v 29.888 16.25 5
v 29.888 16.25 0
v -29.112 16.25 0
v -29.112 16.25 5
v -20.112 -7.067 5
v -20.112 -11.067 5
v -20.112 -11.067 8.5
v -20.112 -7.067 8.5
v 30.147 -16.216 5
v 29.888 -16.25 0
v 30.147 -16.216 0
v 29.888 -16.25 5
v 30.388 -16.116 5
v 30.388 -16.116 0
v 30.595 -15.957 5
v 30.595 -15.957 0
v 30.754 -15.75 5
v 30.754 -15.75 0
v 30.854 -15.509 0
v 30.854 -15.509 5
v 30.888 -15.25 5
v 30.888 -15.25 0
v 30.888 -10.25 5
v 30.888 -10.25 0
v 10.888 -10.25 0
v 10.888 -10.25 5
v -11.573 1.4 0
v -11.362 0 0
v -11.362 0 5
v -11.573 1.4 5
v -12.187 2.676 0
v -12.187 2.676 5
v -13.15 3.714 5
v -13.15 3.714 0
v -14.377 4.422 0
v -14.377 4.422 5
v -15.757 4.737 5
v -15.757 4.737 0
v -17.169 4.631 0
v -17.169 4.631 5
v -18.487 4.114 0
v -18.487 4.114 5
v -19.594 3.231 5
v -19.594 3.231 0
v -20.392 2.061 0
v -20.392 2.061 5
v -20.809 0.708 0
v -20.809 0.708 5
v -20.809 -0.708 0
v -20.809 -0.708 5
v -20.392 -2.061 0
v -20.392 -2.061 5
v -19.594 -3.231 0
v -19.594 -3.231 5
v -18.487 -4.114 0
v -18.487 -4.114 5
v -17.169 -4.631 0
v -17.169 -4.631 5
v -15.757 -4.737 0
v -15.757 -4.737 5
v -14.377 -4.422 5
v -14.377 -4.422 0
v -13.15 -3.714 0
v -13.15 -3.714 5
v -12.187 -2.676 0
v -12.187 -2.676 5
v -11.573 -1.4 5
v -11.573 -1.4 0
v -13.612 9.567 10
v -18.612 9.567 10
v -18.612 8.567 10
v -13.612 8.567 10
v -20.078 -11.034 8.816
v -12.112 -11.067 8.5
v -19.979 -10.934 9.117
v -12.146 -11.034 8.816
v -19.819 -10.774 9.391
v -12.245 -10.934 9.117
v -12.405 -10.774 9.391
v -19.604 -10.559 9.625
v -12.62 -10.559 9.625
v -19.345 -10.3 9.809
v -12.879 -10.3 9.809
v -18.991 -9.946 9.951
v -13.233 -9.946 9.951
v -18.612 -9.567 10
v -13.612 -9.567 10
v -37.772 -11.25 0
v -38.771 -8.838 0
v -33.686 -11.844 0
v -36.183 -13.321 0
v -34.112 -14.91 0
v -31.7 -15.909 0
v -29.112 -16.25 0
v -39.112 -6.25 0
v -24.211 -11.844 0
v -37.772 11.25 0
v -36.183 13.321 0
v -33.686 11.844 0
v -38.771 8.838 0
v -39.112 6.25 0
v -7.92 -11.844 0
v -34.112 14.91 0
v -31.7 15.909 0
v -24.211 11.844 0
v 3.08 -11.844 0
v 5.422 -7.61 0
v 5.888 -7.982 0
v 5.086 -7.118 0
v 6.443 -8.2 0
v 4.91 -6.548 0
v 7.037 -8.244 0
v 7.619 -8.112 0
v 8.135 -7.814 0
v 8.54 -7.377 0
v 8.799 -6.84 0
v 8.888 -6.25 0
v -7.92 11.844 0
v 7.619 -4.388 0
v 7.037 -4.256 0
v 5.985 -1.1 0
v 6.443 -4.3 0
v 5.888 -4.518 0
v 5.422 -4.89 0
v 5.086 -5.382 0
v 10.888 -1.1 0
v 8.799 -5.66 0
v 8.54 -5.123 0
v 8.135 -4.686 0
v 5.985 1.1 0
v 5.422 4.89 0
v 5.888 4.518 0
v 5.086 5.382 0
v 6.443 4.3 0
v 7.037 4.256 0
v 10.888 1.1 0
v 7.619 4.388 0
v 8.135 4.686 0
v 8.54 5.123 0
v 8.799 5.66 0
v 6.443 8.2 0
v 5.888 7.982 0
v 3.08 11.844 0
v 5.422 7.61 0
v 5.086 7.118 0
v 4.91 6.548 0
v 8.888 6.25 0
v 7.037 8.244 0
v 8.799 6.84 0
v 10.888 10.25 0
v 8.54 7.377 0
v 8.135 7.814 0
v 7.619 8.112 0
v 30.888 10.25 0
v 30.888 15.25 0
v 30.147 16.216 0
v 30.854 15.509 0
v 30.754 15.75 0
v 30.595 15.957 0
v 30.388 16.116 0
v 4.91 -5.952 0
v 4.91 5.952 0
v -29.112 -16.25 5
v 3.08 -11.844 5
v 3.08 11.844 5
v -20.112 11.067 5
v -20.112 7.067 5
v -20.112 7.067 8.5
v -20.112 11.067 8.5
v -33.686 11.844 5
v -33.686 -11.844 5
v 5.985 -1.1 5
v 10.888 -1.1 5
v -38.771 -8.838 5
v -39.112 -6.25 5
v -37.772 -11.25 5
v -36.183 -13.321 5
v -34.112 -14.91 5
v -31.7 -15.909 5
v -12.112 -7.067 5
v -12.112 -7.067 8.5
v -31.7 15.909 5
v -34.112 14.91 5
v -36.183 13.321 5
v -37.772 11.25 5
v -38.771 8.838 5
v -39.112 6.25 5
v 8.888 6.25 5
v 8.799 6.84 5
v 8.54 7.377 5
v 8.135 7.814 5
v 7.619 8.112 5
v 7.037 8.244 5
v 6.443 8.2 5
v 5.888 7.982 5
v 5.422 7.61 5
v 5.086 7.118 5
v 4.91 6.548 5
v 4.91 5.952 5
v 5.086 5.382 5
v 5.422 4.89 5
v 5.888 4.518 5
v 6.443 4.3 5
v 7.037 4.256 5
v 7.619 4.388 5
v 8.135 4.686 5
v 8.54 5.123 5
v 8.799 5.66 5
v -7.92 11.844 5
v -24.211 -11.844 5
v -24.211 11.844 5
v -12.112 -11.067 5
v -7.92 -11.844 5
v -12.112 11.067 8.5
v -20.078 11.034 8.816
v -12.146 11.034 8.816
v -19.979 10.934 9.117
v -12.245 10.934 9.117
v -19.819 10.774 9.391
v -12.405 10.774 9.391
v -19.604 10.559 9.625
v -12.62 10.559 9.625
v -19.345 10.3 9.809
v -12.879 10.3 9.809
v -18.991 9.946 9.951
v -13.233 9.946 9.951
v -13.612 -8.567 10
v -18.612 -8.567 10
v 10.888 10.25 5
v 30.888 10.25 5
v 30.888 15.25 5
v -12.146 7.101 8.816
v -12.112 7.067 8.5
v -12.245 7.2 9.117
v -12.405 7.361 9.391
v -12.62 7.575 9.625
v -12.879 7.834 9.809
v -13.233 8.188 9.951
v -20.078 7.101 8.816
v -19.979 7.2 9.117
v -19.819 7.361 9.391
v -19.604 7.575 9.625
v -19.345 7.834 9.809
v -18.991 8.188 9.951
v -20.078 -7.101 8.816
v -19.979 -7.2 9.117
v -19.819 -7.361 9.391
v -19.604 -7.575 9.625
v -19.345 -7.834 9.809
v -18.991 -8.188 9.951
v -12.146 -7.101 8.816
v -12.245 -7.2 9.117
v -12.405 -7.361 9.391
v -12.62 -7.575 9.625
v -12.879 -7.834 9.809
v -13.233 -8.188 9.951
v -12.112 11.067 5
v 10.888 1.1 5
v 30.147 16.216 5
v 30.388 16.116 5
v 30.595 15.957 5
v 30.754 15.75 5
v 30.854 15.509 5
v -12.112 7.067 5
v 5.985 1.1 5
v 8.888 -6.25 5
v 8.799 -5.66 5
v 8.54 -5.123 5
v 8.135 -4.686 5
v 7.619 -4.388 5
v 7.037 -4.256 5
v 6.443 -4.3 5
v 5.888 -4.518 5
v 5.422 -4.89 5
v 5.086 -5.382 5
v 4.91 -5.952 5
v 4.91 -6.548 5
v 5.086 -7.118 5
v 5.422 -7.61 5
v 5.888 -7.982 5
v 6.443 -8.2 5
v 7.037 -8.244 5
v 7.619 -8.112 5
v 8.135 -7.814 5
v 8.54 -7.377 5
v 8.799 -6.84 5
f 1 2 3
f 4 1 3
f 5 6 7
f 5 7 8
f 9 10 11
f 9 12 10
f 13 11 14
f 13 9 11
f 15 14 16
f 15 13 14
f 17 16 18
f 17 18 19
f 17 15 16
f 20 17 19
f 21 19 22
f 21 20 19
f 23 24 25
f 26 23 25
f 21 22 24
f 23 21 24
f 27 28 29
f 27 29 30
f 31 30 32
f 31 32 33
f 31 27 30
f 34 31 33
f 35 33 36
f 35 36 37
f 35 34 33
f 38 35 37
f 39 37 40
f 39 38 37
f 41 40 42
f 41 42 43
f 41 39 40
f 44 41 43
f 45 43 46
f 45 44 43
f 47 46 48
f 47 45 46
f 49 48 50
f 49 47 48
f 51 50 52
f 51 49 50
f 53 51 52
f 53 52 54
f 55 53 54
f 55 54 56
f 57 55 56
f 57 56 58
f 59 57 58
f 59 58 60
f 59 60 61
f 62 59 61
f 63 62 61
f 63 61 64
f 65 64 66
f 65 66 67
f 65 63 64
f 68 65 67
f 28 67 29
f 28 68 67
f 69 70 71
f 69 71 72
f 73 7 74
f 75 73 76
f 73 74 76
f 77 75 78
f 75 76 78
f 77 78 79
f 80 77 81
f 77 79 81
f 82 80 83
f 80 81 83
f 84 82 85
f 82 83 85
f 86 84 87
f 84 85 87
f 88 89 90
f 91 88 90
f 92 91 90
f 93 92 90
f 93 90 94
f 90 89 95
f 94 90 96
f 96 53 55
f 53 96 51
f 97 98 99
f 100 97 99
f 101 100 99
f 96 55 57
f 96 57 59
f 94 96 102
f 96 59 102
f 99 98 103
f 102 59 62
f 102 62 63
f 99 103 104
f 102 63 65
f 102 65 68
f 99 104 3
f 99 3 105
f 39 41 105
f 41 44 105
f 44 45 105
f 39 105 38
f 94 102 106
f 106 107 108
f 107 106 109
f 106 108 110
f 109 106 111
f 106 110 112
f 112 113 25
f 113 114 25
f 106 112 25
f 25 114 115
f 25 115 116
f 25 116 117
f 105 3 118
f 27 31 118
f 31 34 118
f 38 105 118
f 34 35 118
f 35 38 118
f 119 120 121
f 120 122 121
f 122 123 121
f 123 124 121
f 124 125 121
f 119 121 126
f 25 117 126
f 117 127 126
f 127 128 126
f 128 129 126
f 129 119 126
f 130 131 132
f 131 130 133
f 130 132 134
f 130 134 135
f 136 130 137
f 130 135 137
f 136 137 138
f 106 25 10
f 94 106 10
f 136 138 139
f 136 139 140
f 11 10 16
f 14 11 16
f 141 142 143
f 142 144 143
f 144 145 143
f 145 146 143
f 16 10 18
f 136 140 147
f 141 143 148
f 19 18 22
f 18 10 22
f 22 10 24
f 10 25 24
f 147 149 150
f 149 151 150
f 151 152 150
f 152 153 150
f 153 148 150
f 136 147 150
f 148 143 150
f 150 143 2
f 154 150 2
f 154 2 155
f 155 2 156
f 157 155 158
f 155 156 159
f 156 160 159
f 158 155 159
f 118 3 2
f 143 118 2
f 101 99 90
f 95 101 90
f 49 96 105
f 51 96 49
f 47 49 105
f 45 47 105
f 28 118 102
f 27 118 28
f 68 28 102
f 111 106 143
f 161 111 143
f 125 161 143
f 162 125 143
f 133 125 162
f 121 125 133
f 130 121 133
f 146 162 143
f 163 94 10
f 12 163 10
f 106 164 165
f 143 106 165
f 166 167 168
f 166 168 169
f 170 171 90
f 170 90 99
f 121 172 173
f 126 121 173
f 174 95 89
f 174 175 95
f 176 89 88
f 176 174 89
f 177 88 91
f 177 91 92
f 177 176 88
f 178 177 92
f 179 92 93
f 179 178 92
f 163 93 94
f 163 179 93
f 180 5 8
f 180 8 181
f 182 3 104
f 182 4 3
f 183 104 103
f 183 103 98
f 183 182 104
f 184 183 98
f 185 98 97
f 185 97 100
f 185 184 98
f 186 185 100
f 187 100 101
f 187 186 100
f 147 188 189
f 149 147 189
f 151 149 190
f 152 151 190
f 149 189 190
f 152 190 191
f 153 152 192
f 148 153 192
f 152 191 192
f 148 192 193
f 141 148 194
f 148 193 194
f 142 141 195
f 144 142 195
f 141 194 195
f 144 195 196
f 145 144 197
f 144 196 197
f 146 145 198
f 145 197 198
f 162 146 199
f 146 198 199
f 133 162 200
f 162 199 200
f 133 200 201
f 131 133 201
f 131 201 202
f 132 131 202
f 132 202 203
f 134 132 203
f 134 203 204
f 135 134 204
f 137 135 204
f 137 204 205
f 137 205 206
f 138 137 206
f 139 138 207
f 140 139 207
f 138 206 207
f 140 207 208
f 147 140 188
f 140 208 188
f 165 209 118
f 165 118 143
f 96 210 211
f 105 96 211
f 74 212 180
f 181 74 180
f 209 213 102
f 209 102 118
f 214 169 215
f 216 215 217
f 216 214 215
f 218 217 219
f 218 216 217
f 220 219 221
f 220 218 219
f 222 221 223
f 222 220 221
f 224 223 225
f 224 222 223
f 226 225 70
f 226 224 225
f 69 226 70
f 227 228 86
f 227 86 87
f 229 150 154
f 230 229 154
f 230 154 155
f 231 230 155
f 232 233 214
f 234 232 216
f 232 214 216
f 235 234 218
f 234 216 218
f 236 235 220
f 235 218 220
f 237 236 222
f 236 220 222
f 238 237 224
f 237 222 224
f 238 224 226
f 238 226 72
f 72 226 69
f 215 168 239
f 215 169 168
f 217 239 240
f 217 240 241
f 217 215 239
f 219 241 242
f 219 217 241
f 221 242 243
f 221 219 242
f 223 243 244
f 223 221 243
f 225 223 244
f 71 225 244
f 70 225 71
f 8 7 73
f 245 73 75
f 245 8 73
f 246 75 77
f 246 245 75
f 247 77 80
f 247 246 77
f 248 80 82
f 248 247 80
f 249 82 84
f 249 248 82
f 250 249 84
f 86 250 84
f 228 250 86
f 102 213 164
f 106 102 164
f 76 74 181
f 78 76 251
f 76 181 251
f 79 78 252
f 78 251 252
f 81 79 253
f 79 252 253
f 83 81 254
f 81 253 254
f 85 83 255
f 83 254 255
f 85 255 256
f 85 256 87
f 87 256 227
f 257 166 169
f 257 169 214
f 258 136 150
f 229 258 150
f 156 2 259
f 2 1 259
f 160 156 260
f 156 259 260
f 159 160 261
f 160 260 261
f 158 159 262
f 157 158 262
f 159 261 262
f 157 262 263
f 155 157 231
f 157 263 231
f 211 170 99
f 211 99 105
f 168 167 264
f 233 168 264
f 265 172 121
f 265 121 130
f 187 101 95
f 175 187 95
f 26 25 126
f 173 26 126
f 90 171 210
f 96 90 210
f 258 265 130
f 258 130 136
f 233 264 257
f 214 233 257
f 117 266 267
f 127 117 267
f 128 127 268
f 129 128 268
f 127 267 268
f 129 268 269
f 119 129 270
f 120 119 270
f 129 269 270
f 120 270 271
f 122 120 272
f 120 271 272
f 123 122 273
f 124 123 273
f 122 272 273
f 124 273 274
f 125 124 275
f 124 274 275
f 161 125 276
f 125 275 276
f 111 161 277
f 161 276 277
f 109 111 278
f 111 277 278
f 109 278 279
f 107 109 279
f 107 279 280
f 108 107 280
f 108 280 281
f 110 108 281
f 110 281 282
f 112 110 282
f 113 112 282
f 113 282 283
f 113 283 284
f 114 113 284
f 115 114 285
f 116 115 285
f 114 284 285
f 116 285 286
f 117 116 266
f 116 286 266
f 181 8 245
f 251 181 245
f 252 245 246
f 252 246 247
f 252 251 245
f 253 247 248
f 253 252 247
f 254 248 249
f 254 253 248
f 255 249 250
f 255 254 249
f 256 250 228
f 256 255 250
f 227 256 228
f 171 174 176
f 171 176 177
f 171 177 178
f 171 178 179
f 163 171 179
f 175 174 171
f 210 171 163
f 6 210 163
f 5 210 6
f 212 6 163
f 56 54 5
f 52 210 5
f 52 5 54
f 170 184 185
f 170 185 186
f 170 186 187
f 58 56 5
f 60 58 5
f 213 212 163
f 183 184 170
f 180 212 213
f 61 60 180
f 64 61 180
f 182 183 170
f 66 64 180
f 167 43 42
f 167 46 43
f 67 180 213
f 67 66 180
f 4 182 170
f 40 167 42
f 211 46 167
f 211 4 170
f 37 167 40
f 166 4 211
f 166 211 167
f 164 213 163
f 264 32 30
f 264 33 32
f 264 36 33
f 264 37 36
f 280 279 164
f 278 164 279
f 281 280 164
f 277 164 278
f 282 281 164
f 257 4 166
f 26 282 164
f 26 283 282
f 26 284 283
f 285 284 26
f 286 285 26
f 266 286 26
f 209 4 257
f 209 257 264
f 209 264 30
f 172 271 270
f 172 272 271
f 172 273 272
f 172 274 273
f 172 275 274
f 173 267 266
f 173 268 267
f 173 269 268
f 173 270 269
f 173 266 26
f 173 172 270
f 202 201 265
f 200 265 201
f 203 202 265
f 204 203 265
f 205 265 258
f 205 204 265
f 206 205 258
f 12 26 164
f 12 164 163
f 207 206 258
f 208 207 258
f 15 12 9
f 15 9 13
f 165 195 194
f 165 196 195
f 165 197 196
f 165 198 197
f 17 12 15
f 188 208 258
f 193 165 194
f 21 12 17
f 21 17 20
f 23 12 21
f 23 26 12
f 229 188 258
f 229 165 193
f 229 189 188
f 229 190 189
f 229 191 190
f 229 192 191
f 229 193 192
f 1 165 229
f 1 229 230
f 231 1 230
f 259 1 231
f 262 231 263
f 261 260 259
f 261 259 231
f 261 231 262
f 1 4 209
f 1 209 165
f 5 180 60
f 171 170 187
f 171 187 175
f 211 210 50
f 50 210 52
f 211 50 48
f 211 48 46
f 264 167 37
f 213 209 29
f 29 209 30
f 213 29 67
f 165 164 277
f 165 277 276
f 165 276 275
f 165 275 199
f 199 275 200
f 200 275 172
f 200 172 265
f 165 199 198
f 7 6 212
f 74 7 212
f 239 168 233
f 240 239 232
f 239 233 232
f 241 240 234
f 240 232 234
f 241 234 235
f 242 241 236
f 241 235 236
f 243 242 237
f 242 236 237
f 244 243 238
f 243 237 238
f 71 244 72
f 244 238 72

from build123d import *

# Parameters (mm, degrees)
SKETCH_R      = 4.75
PAD_DEPTH     = 5
FILLET_R      = 10
FILLET001_R   = 1
SKETCH001_R   = 2
SKETCH001_W   = 9.475223
SKETCH001_H   = 23.68809
SKETCH001_W_2 = 11
SKETCH001_W_3 = 4.903309
SKETCH001_H_2 = 2.2
POCKET_DEPTH  = 5
SKETCH002_W   = 8
SKETCH002_H   = 4
PAD001_DEPTH  = 5
FILLET002_R   = 1.5


with BuildPart() as part:
    # Sketch → Pad (new body)
    with BuildSketch(Plane.XY):
        Polygon((30.887989, 10.25), (30.887989, 16.25), (-39.112011, 16.25), (-39.112011, -16.25), (30.887989, -16.25), (30.887989, -10.25), (10.887989, -10.25), (10.887989, 10.25), align=None)
        with Locations((-16.112011, 0)):
            Circle(SKETCH_R, mode=Mode.SUBTRACT)
    extrude(amount=PAD_DEPTH)

    # Fillet
    fillet_edges = [part.edges().sort_by_distance(p)[0] for p in [
        (-39.112011, -16.25, 2.5),
        (-39.112011, 16.25, 2.5),
    ]]
    fillet(fillet_edges, radius=FILLET_R)

    # Fillet001
    fillet001_edges = [part.edges().sort_by_distance(p)[0] for p in [
        (30.887989, -16.25, 2.5),
        (30.887989, 16.25, 2.5),
    ]]
    fillet(fillet001_edges, radius=FILLET001_R)

    # Sketch001 (on Face5 of Fillet001) → Pocket (cut)
    with BuildSketch(Plane.XY.offset(5)):
        with Locations((6.887989, 6.25)):
            Circle(SKETCH001_R)
        with Locations((6.887989, -6.25)):
            Circle(SKETCH001_R)
        with Locations((-28.9485835, 0)):
            Rectangle(SKETCH001_W, SKETCH001_H)
        with Locations((-2.4204911845, 0)):
            Rectangle(SKETCH001_W_2, SKETCH001_H)
        with Locations((8.4363345, 0)):
            Rectangle(SKETCH001_W_3, SKETCH001_H_2)
    extrude(amount=-POCKET_DEPTH, mode=Mode.SUBTRACT)

    # Sketch002 (on Face5 of Pocket) → Pad001 (join)
    with BuildSketch(Plane.XY.offset(5)):
        with Locations((-16.112011, 9.067142847)):
            Rectangle(SKETCH002_W, SKETCH002_H)
        with Locations((-16.112011, -9.067142847)):
            Rectangle(SKETCH002_W, SKETCH002_H)
    extrude(amount=PAD001_DEPTH)

    # Fillet002
    fillet002_edges = [part.edges().sort_by_distance(p)[0] for p in [
        (-16.112011, 11.067143, 10),
        (-12.112011, 9.067143, 10),
        (-16.112011, 7.067143, 10),
        (-20.112011, 9.067143, 10),
        (-16.112011, -7.067143, 10),
        (-12.112011, -9.067143, 10),
        (-16.112011, -11.067143, 10),
        (-20.112011, -9.067143, 10),
    ]]
    fillet(fillet002_edges, radius=FILLET002_R)


solid = part.part
